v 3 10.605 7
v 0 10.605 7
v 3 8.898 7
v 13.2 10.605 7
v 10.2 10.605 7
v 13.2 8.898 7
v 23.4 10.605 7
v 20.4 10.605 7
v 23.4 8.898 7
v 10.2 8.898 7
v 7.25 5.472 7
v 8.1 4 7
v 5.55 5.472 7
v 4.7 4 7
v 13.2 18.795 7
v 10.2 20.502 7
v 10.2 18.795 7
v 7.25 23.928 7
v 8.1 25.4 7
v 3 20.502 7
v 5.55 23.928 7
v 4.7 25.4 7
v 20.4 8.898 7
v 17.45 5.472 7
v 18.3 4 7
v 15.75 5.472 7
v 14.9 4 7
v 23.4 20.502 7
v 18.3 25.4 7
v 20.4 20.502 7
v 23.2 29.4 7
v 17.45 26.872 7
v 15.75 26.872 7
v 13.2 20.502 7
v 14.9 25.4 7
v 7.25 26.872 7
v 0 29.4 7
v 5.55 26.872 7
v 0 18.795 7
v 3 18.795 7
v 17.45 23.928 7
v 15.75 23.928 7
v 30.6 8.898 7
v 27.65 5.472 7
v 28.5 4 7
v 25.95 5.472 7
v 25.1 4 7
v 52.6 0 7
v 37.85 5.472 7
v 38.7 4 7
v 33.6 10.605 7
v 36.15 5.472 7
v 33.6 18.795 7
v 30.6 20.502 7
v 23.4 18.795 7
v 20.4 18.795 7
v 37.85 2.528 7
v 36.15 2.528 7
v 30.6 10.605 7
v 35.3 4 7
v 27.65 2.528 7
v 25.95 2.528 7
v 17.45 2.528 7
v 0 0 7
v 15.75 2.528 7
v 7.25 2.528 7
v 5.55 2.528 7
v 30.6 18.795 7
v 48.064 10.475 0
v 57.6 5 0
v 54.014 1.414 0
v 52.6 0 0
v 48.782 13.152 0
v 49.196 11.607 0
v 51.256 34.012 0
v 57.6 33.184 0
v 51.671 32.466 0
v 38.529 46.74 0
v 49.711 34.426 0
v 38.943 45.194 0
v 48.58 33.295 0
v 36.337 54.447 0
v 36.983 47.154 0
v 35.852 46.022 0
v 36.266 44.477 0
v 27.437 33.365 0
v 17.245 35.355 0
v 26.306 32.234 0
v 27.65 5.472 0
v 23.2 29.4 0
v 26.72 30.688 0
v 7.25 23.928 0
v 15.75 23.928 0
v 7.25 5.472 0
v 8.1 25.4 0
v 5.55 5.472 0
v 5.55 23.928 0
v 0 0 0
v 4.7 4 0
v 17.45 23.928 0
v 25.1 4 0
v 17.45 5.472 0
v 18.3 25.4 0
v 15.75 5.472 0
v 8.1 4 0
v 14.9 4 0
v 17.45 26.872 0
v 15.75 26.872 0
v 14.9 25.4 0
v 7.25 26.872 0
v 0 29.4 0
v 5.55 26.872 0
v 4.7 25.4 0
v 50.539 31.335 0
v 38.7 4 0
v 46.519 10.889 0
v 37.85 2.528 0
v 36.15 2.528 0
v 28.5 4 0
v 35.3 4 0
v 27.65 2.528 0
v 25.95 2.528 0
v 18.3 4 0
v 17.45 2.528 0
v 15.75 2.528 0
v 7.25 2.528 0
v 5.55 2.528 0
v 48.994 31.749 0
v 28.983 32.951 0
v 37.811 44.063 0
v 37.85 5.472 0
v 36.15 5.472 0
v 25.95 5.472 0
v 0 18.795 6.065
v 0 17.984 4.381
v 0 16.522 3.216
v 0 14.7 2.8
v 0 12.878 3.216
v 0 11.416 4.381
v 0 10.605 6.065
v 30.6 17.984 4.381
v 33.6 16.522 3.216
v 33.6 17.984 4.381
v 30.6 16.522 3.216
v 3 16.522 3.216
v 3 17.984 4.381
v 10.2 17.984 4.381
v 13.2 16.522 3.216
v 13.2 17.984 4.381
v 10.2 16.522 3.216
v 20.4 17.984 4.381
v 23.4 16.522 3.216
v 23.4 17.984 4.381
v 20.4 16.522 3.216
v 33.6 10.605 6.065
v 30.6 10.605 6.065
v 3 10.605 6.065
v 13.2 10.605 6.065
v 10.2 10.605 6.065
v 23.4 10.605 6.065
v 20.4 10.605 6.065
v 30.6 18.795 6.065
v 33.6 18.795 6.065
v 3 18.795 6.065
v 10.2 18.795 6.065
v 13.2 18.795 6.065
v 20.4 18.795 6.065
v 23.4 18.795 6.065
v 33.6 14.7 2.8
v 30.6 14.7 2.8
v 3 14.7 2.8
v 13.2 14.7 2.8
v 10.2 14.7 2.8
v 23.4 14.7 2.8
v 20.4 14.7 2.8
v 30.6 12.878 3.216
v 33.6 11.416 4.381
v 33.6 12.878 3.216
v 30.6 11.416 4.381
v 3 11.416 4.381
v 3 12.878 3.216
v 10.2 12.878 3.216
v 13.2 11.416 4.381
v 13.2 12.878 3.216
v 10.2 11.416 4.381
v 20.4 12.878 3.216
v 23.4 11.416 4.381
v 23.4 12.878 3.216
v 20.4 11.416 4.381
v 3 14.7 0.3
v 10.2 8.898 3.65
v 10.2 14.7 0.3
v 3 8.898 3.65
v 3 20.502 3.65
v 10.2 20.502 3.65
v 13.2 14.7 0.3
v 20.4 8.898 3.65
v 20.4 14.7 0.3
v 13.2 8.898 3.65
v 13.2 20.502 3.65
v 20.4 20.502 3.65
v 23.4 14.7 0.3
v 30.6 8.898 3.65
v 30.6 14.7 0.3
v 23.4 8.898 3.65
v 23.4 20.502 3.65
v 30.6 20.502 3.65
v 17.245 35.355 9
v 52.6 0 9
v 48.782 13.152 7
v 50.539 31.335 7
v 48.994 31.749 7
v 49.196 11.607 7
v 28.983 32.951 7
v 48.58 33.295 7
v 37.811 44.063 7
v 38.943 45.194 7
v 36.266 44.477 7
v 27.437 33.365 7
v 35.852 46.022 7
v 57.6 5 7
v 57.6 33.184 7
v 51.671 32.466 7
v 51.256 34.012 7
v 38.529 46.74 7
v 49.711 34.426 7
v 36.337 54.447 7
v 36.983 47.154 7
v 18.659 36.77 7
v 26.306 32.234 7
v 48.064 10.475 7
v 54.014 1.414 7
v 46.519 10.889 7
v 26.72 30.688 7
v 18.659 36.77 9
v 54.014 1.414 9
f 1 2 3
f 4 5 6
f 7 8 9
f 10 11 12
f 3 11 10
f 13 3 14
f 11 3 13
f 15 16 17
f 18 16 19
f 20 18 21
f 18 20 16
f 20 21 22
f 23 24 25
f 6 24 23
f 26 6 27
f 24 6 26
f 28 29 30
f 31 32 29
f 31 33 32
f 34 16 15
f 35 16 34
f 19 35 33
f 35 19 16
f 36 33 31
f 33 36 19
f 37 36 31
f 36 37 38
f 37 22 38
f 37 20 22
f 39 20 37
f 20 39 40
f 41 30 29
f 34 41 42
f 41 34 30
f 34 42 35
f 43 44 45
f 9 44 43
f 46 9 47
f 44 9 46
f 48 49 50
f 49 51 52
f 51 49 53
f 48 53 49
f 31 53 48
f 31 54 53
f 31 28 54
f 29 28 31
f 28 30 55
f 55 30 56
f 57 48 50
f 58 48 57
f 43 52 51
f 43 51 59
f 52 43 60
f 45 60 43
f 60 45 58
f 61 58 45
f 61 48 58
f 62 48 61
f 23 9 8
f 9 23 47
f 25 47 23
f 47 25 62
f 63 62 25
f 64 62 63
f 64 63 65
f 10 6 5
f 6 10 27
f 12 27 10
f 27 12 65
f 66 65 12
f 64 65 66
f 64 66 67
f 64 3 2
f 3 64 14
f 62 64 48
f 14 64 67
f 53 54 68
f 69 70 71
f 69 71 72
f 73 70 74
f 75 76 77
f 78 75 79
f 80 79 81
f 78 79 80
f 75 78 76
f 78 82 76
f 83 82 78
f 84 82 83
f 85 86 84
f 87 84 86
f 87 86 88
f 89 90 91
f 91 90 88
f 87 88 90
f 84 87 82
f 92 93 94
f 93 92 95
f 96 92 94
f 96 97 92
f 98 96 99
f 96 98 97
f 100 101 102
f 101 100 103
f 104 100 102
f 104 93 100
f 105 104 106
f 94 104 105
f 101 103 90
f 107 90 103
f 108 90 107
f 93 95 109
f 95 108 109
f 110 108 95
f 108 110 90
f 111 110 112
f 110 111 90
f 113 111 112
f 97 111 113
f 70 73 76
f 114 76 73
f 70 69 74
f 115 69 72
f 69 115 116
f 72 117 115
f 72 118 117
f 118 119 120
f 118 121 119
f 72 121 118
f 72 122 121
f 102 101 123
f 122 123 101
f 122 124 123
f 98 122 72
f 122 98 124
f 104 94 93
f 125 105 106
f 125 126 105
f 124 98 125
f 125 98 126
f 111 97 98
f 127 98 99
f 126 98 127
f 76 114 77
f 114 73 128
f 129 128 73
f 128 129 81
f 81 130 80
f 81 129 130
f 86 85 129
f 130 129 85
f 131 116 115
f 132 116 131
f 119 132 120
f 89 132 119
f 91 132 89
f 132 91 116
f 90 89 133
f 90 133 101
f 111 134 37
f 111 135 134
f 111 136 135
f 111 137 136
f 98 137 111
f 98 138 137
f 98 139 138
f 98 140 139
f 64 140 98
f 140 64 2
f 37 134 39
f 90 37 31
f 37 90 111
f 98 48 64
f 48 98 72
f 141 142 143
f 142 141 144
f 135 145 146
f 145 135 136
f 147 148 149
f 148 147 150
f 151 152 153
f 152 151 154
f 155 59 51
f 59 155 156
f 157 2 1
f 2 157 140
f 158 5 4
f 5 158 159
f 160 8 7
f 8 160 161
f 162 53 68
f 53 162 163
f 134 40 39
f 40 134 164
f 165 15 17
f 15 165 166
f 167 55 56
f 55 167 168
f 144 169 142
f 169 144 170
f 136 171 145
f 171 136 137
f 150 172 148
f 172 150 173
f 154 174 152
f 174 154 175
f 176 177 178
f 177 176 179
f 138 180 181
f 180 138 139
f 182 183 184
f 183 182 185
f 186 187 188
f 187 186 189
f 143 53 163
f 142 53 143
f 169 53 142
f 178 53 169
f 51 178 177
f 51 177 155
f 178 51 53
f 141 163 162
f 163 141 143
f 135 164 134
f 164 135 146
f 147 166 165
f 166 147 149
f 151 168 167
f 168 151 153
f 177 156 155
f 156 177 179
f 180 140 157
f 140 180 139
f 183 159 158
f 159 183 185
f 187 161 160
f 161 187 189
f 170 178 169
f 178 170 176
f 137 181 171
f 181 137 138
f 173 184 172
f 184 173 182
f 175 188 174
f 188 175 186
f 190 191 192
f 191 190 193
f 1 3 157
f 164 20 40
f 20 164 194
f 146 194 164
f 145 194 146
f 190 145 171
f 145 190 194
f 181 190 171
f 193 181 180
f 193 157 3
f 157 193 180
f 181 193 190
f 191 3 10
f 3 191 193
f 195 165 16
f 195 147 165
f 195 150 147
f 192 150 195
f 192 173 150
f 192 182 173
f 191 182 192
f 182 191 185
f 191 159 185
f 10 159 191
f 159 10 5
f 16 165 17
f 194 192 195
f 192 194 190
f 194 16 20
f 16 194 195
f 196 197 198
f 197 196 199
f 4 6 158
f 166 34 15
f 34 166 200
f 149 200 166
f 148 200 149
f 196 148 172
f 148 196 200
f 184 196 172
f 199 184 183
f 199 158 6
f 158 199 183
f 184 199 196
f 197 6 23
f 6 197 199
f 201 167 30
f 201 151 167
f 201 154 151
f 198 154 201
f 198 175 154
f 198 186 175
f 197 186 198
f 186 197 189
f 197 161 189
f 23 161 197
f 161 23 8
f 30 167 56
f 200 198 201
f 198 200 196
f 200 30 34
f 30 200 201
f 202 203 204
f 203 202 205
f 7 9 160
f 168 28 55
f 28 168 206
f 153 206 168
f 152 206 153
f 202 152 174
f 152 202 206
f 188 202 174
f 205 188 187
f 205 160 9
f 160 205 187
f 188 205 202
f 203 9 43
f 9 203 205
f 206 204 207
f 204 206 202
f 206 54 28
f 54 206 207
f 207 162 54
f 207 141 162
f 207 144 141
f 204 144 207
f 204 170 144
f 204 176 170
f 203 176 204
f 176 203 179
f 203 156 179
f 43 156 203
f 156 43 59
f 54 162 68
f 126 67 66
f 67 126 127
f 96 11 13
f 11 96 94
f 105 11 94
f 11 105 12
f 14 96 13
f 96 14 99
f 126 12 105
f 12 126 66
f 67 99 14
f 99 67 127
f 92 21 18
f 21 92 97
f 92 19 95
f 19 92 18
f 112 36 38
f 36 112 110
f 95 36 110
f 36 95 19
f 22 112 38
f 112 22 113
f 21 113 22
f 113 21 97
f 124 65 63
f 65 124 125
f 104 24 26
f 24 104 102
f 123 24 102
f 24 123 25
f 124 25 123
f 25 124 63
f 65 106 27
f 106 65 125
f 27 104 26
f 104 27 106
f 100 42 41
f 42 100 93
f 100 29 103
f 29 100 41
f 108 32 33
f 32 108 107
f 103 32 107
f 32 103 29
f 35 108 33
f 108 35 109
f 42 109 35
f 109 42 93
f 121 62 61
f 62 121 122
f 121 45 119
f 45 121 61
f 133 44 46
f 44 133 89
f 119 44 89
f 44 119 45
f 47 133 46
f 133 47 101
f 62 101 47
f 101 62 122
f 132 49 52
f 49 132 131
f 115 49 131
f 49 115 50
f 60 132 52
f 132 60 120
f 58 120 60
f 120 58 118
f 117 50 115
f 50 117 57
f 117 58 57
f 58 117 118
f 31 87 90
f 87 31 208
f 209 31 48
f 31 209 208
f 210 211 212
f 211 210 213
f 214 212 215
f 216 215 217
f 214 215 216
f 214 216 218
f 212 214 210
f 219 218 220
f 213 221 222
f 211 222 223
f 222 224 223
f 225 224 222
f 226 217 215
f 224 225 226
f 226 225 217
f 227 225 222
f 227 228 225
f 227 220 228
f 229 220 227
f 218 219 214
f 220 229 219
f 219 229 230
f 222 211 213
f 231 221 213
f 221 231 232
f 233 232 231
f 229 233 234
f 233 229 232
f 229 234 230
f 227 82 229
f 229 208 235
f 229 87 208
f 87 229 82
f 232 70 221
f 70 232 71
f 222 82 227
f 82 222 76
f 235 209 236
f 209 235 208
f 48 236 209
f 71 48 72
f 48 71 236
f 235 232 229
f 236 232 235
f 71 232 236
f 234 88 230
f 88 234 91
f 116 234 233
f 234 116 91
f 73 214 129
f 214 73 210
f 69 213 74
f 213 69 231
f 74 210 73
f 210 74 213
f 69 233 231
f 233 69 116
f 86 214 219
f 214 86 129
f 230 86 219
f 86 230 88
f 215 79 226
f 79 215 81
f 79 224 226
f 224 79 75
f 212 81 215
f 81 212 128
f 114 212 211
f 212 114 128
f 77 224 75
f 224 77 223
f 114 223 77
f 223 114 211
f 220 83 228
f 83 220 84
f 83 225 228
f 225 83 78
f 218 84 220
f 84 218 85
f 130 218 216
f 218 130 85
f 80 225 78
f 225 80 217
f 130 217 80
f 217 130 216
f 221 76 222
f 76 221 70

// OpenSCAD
// file: Cubo.scad
// -----------------
// module cubo
// GPL v2.0
// yvoz.lg@gmail.com
// -----------------


// exemples ----

cubo([10,10,5], [1,2,3,4,5,6,7,8,9,10,11,12], 1.5);

translate([15, 0, 0]){
	difference(){
		cubo([10,20,5], [2,3], 3);
		translate([5,10,-1]) cylinder(r=2, h=7, $fn=12);
	}
}

translate([-15, 0, 0]){
	difference(){
		cube([10,20,15]);
		translate([3,3,3]) cubo([10,20,50], [1,5], 3);
	}
}

// ------------

module cubo(dim, cro, a){

	diago = sqrt(pow(a,2)+pow(a,2));
	difference(){
		cube(dim);
		
		for(i=cro){
			//x
			if(i==1){
				translate([-1, 0, -diago/2])
				rotate([45, 0, 0])
				cube([dim.x+2, a, a]);
			}
			if(i==2){
				translate([-1, 0, dim.z-diago/2])
				rotate([45, 0, 0])
				cube([dim.x+2, a, a]);
			}
			if(i==3){
				translate([-1, dim.y, dim.z-diago/2])
				rotate([45, 0, 0])
				cube([dim.x+2, a, a]);
			}
			if(i==4){
				translate([-1, dim.y, -diago/2])
				rotate([45, 0, 0])
				cube([dim.x+2, a, a]);
			}
			//y
			if(i==5){
				translate([-diago/2, -1, 0])
				rotate([0, 45, 0])
				cube([a, dim.y+2, a]);
			}
			if(i==6){
				translate([dim.x-diago/2, -1, 0])
				rotate([0, 45, 0])
				cube([a, dim.y+2, a]);
			}
			if(i==7){
				translate([dim.x-diago/2, -1, dim.z])
				rotate([0, 45, 0])
				cube([a, dim.y+2, a]);
			}
			if(i==8){
				translate([-diago/2, -1, dim.z])
				rotate([0, 45, 0])
				cube([a, dim.y+2, a]);
			}
			//z
			if(i==9){
				translate([0, -diago/2, -1])
				rotate([0, 0, 45])
				cube([a, a, dim.z+2]);
			}
			if(i==10){
				translate([0, dim.y-diago/2, -1])
				rotate([0, 0, 45])
				cube([a, a, dim.z+2]);
			}
			if(i==11){
				translate([dim.x, dim.y-diago/2, -1])
				rotate([0, 0, 45])
				cube([a, a, dim.z+2]);
			}
			if(i==12){
				translate([dim.x, -diago/2, -1])
				rotate([0, 0, 45])
				cube([a, a, dim.z+2]);
			}
		}
	}
}
// file: Hexa.scad
// include <Hexa.scad>;

m3h = 2.4;
m3k = 5.5;
m3r = m3k/2;

m4h = 3.2;
m4k = 7;
m4r = m4k/2;

m5h = 4.7;
m5k = 8;
m5r = m5k/2;

m6h = 5.2;
m6k = 10;
m6r = m6k/2;

m8h = 6.8;
m8k = 13;
m8r = m8k/2;

coef = 2/sqrt(3);
echo(coef);

module m3(jk=0, jh=0, jvis=0){
    d = m3k * coef;
    cylinder(r=d/2+jk, h=m3h+jh, $fn=6);
    if(jvis != 0){
        translate([0,0,-30]) cylinder(r=3/2+jvis, h=60, $fn=12);
    }
}
// main file
include <Hexa.scad>;
use<Cubo.scad>;

ep = 7;
es = 3; // entre ecrous x
ey = 8; // ecrou <> bord y

dix = 22; // vis serrage <> bas de piece
j= 0.2;

module axe(jret=0) difference(){
	cube([(es+j+m8h+j)*3+dix, ey+j+m8k+j+ey, ep], [1,4], ep/3);
	
	// tige
	translate([-1, ey+j+m8k/2, ep]) rotate([0,90,0]) cylinder(r=4+j, h=(es+j+m8h+j)*3+es+1);
	// ecrous
	translate([es, ey+j+m8k/2, ep]) rotate([0,90,0]) cylinder(r=m8r+j, h=j+m8h+j, $fn=6);
	translate([(es+j+m8h+j)+es, ey+j+m8k/2, ep]) rotate([0,90,0]) cylinder(r=m8r+j, h=j+m8h+j, $fn=6);
	translate([(es+j+m8h+j)*2+es, ey+j+m8k/2, ep]) rotate([0,90,0]) cylinder(r=m8r+j, h=j+m8h+j, $fn=6);
	
	// vis serrages
	translate([es+m8h/2, ey/2, -1]) cylinder(r=1.7, h=ep+2);
	translate([es+m8h/2, ey+j+m8k+j+ey/2, -1]) cylinder(r=1.7, h=ep+2);
	
	translate([(es+j+m8h+j)*1+es+m8h/2, ey/2, -1]) cylinder(r=1.7, h=ep+2);
	translate([(es+j+m8h+j)*1+es+m8h/2, ey+j+m8k+j+ey/2, -1]) cylinder(r=1.7, h=ep+2);
	
	translate([(es+j+m8h+j)*2+es+m8h/2, ey/2, -1]) cylinder(r=1.7, h=ep+2);
	//translate([(es+j+m8h+j)*2+m8h/2, ey+j+m8k+j+ey/2, -1]) cylinder(r=1.7, h=ep+2);
	translate([(es+j+m8h+j)*3+es+m8h/2, ey/2, -1]) cylinder(r=1.7, h=ep+2);
	
	// trunc base
	translate([(es+j+m8h+j)*3+dix, -jret, -1]) rotate([0,0,45]) cube([lcx, lcy, ep*2]);
	
}

lcx = 27;
lcy = 50;
// 47; // coté du carré pointe <> pointe
//lvx = 16; // x vis 
//lvy = 11; // y vis

module lame() difference(){
	union() {
		translate([(es+j+m8h+j)*3+dix, 0,0]) rotate([0,0,45]) cube([lcx, lcy, ep], [1,4], ep/3);
		// corniche
		translate([(es+j+m8h+j)*3+dix, 0,0]) rotate([0,0,45]) cube([2, lcy, ep+2]);
	}
	// trous fixator
	translate([(es+j+m8h+j)*3+dix, 0,0]) rotate([0,0,45]) {
		lx1 = 5;
		ly1 = 12;
		ly2 = 40;
		lx2 = 20 + 1.5;
		hull(){
			translate([lx1, ly1, -1]) cylinder(r=1.6, h=ep*2);
			translate([lx1, ly2, -1]) cylinder(r=1.6, h=ep*2);
		}
		translate([lx2, 25, -1]) cylinder(r=1.6, h=ep*2);
		translate([lx2, 43, -1]) cylinder(r=1.6, h=ep*2);
	}
	
	// surface
	translate([(es+j+m8h+j)*3+dix+5, -1,-1])  cube([lcx, lcy, ep+2]);
}

module surlame(){
	
}
	

axe();
//translate([0,0,ep*2]) mirror([0,0,1]) axe(0.5);
lame();
translate([0,0,ep+1]) surlame();
